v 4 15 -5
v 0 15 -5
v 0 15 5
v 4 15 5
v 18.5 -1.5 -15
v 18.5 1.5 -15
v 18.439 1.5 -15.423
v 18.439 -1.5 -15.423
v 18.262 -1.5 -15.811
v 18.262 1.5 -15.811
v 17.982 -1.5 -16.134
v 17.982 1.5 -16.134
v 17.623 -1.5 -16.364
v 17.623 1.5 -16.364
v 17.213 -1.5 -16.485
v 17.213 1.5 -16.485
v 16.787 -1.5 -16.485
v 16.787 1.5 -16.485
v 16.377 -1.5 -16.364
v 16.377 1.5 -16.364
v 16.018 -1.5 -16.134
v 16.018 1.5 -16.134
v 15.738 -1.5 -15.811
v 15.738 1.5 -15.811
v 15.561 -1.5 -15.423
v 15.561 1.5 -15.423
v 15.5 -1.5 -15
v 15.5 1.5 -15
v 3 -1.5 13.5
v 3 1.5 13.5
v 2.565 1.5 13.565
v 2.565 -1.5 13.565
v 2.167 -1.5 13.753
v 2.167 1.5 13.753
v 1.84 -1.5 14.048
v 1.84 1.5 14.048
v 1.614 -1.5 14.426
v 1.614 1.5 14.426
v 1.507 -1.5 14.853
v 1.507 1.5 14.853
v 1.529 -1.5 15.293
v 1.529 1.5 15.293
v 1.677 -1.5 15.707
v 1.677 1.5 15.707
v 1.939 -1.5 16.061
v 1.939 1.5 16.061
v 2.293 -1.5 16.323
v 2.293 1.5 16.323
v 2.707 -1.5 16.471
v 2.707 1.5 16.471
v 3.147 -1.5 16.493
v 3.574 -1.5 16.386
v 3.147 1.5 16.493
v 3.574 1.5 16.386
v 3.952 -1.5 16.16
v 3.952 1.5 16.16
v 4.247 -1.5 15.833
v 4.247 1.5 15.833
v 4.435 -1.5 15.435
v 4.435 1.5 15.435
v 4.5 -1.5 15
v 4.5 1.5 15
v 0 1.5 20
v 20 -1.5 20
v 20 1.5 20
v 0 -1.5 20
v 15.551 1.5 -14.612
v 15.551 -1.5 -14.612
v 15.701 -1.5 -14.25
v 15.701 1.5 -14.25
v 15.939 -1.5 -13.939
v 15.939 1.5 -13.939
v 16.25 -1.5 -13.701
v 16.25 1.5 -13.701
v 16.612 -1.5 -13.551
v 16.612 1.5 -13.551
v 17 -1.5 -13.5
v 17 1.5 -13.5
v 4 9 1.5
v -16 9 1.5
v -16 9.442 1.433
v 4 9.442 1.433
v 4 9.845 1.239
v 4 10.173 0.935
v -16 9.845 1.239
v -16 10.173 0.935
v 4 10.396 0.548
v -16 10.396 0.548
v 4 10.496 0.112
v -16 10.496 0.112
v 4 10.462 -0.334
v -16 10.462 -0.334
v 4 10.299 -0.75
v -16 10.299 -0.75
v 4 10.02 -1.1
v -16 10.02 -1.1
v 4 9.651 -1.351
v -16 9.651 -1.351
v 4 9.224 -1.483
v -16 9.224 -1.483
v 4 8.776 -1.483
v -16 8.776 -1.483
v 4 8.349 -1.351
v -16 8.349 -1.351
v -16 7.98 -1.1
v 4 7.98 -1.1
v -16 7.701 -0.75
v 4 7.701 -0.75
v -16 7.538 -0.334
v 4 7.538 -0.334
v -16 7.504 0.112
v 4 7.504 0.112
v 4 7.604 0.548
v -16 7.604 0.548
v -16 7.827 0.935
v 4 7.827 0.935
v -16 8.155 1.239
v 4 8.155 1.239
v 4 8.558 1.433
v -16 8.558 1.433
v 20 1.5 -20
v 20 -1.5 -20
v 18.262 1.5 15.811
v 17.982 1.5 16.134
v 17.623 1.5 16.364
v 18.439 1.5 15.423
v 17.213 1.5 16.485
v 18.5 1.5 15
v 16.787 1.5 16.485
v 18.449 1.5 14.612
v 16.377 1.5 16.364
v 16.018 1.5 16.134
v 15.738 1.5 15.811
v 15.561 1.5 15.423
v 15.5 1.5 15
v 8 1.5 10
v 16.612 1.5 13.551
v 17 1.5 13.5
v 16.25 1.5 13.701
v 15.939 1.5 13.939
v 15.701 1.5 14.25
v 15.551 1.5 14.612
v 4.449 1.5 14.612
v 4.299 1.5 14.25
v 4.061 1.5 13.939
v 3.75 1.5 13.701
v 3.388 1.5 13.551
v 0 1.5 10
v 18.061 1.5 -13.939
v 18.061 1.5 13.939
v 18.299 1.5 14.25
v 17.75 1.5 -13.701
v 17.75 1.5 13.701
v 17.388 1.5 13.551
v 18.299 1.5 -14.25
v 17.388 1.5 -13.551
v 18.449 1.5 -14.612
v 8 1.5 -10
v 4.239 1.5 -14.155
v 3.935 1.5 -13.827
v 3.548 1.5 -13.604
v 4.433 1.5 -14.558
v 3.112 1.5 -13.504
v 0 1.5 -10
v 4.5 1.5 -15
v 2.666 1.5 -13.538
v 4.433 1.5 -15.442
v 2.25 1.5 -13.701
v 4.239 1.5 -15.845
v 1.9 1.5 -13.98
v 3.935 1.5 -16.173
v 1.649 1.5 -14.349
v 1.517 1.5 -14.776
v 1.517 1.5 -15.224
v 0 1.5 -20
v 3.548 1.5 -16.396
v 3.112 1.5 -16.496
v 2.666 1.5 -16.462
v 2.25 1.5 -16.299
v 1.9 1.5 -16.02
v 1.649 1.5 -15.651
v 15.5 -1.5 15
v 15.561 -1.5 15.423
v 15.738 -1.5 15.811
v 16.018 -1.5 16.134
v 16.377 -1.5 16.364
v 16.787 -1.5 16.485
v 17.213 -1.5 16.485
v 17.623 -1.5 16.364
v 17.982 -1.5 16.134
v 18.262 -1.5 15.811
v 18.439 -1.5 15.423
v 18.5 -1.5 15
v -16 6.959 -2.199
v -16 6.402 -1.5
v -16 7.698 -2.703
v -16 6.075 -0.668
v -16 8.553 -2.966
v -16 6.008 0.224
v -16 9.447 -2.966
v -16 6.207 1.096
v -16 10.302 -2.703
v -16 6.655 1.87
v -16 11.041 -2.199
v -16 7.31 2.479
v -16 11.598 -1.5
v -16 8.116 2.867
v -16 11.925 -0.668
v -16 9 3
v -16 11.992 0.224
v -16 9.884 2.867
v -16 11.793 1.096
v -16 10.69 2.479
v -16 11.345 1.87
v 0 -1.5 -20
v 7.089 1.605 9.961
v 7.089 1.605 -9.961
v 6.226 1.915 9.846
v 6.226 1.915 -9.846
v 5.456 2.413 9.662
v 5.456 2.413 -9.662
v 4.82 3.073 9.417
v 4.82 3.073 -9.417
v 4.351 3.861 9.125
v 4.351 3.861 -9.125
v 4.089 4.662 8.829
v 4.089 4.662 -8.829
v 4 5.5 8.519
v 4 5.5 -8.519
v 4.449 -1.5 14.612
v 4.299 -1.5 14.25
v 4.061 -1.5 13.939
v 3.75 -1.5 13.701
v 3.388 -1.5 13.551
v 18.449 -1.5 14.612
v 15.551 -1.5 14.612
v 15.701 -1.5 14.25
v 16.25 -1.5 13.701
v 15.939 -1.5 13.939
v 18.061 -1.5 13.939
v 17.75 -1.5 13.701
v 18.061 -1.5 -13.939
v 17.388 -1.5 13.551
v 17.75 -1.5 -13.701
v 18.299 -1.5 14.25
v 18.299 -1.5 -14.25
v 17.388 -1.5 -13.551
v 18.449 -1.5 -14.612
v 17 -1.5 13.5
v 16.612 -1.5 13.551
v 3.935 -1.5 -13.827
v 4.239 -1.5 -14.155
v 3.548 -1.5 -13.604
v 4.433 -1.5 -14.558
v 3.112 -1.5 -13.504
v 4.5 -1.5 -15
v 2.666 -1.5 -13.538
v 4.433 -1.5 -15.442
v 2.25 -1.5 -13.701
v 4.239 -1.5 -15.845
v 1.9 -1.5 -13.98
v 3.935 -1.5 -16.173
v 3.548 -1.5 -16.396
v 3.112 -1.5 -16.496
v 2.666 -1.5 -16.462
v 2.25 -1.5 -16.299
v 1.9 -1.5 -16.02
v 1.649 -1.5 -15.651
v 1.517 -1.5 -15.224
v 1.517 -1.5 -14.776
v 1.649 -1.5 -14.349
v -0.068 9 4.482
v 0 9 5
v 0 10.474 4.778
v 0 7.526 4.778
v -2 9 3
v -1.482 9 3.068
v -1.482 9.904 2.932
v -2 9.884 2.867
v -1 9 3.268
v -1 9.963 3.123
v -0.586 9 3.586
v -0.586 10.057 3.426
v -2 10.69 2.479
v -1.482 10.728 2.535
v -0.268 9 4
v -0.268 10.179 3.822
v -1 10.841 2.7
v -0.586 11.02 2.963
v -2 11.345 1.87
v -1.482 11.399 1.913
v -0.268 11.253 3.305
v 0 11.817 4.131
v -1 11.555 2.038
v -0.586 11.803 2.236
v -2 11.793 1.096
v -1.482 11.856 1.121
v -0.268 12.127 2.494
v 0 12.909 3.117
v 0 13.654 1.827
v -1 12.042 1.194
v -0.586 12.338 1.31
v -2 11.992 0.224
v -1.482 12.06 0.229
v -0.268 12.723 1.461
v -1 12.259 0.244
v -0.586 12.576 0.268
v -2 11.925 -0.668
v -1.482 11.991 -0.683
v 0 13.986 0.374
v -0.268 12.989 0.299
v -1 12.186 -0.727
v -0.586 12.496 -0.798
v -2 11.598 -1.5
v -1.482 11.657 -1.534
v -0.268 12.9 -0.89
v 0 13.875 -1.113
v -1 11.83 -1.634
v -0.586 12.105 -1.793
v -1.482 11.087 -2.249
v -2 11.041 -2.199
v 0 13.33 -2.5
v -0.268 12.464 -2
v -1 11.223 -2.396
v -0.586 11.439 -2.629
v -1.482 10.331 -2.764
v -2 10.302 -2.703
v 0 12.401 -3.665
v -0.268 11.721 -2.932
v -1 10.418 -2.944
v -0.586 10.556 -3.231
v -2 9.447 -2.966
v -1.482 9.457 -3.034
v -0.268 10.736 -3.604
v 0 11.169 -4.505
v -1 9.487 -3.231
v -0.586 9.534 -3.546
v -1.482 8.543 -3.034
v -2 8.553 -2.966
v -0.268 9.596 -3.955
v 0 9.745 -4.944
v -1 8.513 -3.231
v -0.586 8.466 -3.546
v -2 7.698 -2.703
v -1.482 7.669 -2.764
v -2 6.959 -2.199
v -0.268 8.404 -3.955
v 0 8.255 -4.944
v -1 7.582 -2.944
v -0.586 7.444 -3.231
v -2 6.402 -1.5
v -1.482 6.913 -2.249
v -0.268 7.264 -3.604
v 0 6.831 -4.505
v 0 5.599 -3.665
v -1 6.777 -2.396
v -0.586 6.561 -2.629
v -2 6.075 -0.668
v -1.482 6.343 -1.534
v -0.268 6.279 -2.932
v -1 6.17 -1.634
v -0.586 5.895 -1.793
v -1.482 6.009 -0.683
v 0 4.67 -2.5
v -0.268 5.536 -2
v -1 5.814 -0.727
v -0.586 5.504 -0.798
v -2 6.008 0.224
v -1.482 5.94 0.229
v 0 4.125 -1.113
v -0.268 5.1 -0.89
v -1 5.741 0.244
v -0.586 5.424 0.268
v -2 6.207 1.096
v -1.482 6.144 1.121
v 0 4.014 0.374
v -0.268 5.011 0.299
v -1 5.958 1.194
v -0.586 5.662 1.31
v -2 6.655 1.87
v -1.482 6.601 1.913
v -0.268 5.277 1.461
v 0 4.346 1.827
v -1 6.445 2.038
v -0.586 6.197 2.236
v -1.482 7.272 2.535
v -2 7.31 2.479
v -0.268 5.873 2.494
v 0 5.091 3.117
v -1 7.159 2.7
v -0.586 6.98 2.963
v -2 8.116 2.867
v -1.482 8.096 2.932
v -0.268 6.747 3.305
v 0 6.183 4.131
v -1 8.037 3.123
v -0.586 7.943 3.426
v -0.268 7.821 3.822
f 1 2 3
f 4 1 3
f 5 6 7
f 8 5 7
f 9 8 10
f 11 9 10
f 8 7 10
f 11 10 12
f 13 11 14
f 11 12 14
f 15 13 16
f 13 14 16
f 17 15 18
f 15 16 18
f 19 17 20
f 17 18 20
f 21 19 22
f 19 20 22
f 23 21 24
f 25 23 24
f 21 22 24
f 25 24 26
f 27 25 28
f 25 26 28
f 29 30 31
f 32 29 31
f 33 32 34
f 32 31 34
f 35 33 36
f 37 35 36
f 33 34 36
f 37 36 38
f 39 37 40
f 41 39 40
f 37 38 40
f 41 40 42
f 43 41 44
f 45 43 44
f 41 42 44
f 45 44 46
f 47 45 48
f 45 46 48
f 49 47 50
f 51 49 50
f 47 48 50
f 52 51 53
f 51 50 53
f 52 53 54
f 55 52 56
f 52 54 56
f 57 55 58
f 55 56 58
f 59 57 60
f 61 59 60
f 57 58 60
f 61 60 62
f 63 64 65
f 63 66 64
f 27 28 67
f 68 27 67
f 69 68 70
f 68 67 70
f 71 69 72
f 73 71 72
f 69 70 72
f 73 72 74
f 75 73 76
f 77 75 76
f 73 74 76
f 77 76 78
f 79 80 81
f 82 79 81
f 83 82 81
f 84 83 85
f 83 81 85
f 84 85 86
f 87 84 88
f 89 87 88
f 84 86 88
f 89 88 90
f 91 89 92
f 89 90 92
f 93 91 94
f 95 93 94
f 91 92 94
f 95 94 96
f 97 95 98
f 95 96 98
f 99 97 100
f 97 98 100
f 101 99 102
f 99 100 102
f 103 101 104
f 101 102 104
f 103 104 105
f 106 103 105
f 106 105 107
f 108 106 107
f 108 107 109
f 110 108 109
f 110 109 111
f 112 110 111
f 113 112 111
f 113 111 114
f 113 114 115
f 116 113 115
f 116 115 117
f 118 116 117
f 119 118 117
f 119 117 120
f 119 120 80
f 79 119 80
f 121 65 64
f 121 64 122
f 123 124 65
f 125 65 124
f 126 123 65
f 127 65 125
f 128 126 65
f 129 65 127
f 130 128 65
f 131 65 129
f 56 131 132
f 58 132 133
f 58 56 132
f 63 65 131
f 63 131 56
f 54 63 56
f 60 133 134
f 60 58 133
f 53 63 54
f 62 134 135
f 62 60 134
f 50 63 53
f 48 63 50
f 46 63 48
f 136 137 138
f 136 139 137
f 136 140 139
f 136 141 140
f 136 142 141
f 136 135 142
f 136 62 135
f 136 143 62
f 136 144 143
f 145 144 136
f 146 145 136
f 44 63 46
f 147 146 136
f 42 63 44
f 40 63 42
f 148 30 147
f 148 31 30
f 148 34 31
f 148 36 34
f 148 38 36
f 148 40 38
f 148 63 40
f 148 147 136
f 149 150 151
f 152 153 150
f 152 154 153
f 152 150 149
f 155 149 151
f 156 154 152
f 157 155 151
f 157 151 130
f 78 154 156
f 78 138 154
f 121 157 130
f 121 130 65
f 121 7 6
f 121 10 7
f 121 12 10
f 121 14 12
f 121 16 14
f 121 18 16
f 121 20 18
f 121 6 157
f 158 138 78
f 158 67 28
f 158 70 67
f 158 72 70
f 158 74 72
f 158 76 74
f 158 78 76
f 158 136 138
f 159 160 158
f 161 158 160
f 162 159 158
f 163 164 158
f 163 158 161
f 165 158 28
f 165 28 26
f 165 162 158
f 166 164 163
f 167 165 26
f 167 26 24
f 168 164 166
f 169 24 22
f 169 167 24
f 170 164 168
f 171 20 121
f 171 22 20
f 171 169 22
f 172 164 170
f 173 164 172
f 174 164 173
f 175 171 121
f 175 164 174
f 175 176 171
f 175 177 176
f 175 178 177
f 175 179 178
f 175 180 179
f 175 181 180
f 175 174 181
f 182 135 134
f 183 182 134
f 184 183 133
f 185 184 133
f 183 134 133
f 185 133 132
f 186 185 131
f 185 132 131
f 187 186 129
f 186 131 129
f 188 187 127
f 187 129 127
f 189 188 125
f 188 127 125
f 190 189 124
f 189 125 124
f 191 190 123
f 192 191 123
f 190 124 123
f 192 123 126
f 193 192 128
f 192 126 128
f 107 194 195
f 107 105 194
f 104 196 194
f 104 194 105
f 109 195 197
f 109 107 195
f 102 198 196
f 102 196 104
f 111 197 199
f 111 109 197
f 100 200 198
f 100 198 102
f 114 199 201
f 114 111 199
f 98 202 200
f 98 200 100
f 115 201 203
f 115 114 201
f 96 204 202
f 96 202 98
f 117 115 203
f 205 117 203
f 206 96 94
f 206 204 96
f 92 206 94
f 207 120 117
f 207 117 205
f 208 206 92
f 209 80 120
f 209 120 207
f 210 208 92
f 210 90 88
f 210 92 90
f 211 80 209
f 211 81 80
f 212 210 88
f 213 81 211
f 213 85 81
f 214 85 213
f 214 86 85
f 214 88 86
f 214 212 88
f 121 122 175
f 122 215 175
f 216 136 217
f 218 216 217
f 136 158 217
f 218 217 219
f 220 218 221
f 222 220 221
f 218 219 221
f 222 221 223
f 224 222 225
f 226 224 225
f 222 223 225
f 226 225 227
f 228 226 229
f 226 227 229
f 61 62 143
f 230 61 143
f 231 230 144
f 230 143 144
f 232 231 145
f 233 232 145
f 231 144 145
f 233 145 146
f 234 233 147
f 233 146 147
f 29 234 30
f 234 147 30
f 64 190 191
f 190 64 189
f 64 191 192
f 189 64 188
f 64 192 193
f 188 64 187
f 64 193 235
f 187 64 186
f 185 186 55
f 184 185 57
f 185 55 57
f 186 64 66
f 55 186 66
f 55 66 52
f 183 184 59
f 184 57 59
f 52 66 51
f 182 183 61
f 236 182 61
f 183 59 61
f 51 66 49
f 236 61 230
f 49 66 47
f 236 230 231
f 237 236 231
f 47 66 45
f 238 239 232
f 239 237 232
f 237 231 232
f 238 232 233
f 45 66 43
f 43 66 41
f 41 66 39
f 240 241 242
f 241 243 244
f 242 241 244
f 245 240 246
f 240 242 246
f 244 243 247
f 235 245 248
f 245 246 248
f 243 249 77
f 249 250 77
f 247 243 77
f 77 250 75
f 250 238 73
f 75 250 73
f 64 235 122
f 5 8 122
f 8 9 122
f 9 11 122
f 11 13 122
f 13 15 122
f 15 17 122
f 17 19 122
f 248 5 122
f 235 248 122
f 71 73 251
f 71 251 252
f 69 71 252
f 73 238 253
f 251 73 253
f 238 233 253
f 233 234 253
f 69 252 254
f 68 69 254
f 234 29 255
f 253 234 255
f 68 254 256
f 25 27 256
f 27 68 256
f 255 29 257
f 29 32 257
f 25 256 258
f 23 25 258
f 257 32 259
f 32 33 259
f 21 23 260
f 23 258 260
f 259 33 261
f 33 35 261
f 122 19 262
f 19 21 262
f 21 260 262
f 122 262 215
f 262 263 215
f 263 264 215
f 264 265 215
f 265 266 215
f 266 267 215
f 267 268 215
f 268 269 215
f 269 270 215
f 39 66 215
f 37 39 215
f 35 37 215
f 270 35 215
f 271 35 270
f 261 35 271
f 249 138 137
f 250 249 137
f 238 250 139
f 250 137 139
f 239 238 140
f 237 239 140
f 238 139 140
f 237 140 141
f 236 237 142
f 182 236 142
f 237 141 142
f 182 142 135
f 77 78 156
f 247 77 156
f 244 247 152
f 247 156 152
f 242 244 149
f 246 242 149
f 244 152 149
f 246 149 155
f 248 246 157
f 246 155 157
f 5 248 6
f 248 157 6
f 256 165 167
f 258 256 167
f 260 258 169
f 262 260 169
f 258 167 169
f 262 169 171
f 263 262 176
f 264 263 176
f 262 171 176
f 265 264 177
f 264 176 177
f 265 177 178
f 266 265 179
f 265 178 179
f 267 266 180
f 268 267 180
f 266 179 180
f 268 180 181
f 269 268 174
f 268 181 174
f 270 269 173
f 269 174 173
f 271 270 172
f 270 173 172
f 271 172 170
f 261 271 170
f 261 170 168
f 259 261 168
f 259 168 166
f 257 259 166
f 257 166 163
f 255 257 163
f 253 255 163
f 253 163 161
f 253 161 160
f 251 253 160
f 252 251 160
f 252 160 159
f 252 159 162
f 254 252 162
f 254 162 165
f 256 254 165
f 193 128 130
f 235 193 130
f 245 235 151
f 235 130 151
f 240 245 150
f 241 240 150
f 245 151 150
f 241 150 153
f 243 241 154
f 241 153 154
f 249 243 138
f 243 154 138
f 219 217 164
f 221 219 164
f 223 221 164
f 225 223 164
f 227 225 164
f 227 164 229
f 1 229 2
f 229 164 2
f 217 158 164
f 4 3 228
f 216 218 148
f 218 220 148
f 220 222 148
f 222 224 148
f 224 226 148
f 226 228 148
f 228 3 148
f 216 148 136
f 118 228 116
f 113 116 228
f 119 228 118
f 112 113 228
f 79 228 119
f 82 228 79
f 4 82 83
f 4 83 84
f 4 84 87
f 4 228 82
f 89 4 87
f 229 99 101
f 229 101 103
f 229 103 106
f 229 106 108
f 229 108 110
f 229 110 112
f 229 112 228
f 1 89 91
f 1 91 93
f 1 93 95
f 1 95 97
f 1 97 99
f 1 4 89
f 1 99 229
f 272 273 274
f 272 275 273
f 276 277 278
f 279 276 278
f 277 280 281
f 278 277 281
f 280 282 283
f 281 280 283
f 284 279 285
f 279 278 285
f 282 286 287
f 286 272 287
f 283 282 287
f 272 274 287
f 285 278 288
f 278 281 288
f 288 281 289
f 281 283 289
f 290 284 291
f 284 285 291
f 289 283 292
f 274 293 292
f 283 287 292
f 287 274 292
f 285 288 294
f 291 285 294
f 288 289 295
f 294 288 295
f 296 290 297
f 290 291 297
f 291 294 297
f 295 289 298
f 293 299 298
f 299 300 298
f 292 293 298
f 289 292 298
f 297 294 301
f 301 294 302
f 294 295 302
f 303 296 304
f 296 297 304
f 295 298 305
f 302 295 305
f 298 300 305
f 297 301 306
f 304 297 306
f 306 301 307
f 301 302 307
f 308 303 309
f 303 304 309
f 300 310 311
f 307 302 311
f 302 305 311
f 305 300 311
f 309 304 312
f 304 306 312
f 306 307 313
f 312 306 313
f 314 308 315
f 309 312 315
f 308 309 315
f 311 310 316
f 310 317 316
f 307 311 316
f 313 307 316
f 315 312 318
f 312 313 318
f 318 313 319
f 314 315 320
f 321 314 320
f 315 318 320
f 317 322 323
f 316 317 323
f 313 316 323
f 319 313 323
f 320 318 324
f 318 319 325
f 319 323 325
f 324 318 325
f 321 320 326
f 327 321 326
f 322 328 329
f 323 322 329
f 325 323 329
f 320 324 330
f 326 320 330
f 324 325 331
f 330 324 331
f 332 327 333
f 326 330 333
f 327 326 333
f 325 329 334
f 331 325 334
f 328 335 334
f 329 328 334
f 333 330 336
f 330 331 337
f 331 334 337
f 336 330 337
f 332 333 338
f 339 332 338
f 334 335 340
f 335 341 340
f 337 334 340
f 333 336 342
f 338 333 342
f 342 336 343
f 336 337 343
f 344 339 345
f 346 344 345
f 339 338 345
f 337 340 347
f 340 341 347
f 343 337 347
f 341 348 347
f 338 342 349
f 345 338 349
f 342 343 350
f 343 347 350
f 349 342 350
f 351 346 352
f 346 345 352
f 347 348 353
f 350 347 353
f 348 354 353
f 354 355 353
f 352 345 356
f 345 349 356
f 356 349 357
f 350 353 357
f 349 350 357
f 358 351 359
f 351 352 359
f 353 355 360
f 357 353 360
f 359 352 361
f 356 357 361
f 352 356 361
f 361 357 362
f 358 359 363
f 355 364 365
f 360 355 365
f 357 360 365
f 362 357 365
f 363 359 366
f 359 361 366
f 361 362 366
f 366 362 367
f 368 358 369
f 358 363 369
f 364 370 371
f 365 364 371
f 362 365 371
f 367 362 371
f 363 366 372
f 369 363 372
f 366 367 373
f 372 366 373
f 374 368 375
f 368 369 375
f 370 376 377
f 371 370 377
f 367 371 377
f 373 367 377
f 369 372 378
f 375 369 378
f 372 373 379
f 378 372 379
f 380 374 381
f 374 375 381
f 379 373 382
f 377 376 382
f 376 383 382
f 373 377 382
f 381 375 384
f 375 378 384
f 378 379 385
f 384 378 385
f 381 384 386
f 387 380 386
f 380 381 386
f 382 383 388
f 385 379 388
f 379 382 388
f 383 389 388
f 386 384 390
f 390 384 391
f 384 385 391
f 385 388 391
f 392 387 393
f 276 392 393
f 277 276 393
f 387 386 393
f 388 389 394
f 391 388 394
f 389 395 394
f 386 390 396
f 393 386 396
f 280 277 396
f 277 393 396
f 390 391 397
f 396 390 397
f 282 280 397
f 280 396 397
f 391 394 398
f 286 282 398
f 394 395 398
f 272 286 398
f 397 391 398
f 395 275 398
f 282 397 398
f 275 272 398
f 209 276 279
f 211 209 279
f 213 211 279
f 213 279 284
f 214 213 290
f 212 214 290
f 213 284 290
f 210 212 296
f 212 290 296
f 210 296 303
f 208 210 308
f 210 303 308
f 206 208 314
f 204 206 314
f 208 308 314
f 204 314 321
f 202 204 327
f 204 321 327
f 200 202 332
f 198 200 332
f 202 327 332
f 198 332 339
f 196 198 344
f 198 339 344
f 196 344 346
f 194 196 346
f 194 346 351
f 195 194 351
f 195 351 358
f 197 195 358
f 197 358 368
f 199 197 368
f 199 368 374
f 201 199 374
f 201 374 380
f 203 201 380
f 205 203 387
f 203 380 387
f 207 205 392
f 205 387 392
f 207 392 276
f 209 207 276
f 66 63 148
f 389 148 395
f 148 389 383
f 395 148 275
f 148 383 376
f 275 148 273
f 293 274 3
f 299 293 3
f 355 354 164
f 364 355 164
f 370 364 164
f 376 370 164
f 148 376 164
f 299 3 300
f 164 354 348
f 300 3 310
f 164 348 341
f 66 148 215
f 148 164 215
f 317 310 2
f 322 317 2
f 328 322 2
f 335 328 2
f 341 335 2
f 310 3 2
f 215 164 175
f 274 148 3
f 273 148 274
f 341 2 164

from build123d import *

# Parameters (mm, degrees)
SKETCH2_W           = 40
SKETCH2_H           = 3
BOSS_EXTRUDE1_DEPTH = 4
SKETCH3_W           = 40
SKETCH3_H           = 3
BOSS_EXTRUDE2_DEPTH = 16
SKETCH4_R           = 3
BOSS_EXTRUDE3_DEPTH = 16
SKETCH5_R           = 1.5
CUT_EXTRUDE1_DEPTH  = 37
SKETCH6_R           = 1.5
CUT_EXTRUDE2_DEPTH  = 4
FILLET1_R           = 4
FILLET2_R           = 2


with BuildPart() as part:
    # Sketch2 → Boss-Extrude1 (new body)
    with BuildSketch(Plane(origin=(0, 0, 0), x_dir=(0, 0, -1), z_dir=(1, 0, 0))):
        Polygon((-5, 15), (-10, 1.5), (10, 1.5), (5, 15), align=None)
        Rectangle(SKETCH2_W, SKETCH2_H)
    extrude(amount=BOSS_EXTRUDE1_DEPTH)

    # Sketch3 → Boss-Extrude2 (add)
    with BuildSketch(Plane(origin=(4, 0, 0), x_dir=(0, 0, -1), z_dir=(1, 0, 0))):
        Rectangle(SKETCH3_W, SKETCH3_H)
    extrude(amount=BOSS_EXTRUDE2_DEPTH)

    # Sketch4 → Boss-Extrude3 (add)
    with BuildSketch(Plane.ZY):
        with Locations((0, 9)):
            Circle(SKETCH4_R)
    extrude(amount=BOSS_EXTRUDE3_DEPTH)

    # Sketch5 → Cut-Extrude1 (cut, through all)
    with BuildSketch(Plane.ZY.offset(16)):
        with Locations((0, 9)):
            Circle(SKETCH5_R)
    extrude(amount=-CUT_EXTRUDE1_DEPTH, mode=Mode.SUBTRACT)

    # Sketch6 → Cut-Extrude2 (cut, through all)
    with BuildSketch(Plane(origin=(0, 1.5, 0), x_dir=(1, 0, 0), z_dir=(0, 1, 0))):
        with BuildLine():
            ThreePointArc((18.5, 15), (17, 16.5), (15.5, 15))
            Line((15.5, 15), (17, 15))
            Line((17, 15), (17, 13.5))
            ThreePointArc((17, 13.5), (18.060660172, 13.939339828), (18.5, 15))
        make_face()
        with BuildLine():
            Line((17, 15), (15.5, 15))
            ThreePointArc((15.5, 15), (15.939339828, 13.939339828), (17, 13.5))
            Line((17, 13.5), (17, 15))
        make_face()
        with BuildLine():
            ThreePointArc((18.5, -15), (18.060660172, -13.939339828), (17, -13.5))
            Line((17, -13.5), (17, -15))
            Line((17, -15), (15.5, -15))
            ThreePointArc((15.5, -15), (17, -16.5), (18.5, -15))
        make_face()
        with BuildLine():
            Line((17, -15), (17, -13.5))
            ThreePointArc((17, -13.5), (15.939339828, -13.939339828), (15.5, -15))
            Line((15.5, -15), (17, -15))
        make_face()
        with BuildLine():
            ThreePointArc((4.5, -15), (4.060660172, -13.939339828), (3, -13.5))
            Line((3, -13.5), (3, -15))
            Line((3, -15), (4.5, -15))
        make_face()
        with BuildLine():
            Line((3, -15), (3, -13.5))
            ThreePointArc((3, -13.5), (1.939339828, -16.060660172), (4.5, -15))
            Line((4.5, -15), (3, -15))
        make_face()
        with Locations((3, 15)):
            Circle(SKETCH6_R)
    extrude(amount=-CUT_EXTRUDE2_DEPTH, mode=Mode.SUBTRACT)

    # Fillet1
    fillet1_edges = [part.edges().sort_by_distance(p)[0] for p in [
        (4, 1.5, 0),
    ]]
    fillet(fillet1_edges, radius=FILLET1_R)

    # Fillet2
    fillet2_edges = [part.edges().sort_by_distance(p)[0] for p in [
        (0, 9, -3),
    ]]
    fillet(fillet2_edges, radius=FILLET2_R)


solid = part.part
